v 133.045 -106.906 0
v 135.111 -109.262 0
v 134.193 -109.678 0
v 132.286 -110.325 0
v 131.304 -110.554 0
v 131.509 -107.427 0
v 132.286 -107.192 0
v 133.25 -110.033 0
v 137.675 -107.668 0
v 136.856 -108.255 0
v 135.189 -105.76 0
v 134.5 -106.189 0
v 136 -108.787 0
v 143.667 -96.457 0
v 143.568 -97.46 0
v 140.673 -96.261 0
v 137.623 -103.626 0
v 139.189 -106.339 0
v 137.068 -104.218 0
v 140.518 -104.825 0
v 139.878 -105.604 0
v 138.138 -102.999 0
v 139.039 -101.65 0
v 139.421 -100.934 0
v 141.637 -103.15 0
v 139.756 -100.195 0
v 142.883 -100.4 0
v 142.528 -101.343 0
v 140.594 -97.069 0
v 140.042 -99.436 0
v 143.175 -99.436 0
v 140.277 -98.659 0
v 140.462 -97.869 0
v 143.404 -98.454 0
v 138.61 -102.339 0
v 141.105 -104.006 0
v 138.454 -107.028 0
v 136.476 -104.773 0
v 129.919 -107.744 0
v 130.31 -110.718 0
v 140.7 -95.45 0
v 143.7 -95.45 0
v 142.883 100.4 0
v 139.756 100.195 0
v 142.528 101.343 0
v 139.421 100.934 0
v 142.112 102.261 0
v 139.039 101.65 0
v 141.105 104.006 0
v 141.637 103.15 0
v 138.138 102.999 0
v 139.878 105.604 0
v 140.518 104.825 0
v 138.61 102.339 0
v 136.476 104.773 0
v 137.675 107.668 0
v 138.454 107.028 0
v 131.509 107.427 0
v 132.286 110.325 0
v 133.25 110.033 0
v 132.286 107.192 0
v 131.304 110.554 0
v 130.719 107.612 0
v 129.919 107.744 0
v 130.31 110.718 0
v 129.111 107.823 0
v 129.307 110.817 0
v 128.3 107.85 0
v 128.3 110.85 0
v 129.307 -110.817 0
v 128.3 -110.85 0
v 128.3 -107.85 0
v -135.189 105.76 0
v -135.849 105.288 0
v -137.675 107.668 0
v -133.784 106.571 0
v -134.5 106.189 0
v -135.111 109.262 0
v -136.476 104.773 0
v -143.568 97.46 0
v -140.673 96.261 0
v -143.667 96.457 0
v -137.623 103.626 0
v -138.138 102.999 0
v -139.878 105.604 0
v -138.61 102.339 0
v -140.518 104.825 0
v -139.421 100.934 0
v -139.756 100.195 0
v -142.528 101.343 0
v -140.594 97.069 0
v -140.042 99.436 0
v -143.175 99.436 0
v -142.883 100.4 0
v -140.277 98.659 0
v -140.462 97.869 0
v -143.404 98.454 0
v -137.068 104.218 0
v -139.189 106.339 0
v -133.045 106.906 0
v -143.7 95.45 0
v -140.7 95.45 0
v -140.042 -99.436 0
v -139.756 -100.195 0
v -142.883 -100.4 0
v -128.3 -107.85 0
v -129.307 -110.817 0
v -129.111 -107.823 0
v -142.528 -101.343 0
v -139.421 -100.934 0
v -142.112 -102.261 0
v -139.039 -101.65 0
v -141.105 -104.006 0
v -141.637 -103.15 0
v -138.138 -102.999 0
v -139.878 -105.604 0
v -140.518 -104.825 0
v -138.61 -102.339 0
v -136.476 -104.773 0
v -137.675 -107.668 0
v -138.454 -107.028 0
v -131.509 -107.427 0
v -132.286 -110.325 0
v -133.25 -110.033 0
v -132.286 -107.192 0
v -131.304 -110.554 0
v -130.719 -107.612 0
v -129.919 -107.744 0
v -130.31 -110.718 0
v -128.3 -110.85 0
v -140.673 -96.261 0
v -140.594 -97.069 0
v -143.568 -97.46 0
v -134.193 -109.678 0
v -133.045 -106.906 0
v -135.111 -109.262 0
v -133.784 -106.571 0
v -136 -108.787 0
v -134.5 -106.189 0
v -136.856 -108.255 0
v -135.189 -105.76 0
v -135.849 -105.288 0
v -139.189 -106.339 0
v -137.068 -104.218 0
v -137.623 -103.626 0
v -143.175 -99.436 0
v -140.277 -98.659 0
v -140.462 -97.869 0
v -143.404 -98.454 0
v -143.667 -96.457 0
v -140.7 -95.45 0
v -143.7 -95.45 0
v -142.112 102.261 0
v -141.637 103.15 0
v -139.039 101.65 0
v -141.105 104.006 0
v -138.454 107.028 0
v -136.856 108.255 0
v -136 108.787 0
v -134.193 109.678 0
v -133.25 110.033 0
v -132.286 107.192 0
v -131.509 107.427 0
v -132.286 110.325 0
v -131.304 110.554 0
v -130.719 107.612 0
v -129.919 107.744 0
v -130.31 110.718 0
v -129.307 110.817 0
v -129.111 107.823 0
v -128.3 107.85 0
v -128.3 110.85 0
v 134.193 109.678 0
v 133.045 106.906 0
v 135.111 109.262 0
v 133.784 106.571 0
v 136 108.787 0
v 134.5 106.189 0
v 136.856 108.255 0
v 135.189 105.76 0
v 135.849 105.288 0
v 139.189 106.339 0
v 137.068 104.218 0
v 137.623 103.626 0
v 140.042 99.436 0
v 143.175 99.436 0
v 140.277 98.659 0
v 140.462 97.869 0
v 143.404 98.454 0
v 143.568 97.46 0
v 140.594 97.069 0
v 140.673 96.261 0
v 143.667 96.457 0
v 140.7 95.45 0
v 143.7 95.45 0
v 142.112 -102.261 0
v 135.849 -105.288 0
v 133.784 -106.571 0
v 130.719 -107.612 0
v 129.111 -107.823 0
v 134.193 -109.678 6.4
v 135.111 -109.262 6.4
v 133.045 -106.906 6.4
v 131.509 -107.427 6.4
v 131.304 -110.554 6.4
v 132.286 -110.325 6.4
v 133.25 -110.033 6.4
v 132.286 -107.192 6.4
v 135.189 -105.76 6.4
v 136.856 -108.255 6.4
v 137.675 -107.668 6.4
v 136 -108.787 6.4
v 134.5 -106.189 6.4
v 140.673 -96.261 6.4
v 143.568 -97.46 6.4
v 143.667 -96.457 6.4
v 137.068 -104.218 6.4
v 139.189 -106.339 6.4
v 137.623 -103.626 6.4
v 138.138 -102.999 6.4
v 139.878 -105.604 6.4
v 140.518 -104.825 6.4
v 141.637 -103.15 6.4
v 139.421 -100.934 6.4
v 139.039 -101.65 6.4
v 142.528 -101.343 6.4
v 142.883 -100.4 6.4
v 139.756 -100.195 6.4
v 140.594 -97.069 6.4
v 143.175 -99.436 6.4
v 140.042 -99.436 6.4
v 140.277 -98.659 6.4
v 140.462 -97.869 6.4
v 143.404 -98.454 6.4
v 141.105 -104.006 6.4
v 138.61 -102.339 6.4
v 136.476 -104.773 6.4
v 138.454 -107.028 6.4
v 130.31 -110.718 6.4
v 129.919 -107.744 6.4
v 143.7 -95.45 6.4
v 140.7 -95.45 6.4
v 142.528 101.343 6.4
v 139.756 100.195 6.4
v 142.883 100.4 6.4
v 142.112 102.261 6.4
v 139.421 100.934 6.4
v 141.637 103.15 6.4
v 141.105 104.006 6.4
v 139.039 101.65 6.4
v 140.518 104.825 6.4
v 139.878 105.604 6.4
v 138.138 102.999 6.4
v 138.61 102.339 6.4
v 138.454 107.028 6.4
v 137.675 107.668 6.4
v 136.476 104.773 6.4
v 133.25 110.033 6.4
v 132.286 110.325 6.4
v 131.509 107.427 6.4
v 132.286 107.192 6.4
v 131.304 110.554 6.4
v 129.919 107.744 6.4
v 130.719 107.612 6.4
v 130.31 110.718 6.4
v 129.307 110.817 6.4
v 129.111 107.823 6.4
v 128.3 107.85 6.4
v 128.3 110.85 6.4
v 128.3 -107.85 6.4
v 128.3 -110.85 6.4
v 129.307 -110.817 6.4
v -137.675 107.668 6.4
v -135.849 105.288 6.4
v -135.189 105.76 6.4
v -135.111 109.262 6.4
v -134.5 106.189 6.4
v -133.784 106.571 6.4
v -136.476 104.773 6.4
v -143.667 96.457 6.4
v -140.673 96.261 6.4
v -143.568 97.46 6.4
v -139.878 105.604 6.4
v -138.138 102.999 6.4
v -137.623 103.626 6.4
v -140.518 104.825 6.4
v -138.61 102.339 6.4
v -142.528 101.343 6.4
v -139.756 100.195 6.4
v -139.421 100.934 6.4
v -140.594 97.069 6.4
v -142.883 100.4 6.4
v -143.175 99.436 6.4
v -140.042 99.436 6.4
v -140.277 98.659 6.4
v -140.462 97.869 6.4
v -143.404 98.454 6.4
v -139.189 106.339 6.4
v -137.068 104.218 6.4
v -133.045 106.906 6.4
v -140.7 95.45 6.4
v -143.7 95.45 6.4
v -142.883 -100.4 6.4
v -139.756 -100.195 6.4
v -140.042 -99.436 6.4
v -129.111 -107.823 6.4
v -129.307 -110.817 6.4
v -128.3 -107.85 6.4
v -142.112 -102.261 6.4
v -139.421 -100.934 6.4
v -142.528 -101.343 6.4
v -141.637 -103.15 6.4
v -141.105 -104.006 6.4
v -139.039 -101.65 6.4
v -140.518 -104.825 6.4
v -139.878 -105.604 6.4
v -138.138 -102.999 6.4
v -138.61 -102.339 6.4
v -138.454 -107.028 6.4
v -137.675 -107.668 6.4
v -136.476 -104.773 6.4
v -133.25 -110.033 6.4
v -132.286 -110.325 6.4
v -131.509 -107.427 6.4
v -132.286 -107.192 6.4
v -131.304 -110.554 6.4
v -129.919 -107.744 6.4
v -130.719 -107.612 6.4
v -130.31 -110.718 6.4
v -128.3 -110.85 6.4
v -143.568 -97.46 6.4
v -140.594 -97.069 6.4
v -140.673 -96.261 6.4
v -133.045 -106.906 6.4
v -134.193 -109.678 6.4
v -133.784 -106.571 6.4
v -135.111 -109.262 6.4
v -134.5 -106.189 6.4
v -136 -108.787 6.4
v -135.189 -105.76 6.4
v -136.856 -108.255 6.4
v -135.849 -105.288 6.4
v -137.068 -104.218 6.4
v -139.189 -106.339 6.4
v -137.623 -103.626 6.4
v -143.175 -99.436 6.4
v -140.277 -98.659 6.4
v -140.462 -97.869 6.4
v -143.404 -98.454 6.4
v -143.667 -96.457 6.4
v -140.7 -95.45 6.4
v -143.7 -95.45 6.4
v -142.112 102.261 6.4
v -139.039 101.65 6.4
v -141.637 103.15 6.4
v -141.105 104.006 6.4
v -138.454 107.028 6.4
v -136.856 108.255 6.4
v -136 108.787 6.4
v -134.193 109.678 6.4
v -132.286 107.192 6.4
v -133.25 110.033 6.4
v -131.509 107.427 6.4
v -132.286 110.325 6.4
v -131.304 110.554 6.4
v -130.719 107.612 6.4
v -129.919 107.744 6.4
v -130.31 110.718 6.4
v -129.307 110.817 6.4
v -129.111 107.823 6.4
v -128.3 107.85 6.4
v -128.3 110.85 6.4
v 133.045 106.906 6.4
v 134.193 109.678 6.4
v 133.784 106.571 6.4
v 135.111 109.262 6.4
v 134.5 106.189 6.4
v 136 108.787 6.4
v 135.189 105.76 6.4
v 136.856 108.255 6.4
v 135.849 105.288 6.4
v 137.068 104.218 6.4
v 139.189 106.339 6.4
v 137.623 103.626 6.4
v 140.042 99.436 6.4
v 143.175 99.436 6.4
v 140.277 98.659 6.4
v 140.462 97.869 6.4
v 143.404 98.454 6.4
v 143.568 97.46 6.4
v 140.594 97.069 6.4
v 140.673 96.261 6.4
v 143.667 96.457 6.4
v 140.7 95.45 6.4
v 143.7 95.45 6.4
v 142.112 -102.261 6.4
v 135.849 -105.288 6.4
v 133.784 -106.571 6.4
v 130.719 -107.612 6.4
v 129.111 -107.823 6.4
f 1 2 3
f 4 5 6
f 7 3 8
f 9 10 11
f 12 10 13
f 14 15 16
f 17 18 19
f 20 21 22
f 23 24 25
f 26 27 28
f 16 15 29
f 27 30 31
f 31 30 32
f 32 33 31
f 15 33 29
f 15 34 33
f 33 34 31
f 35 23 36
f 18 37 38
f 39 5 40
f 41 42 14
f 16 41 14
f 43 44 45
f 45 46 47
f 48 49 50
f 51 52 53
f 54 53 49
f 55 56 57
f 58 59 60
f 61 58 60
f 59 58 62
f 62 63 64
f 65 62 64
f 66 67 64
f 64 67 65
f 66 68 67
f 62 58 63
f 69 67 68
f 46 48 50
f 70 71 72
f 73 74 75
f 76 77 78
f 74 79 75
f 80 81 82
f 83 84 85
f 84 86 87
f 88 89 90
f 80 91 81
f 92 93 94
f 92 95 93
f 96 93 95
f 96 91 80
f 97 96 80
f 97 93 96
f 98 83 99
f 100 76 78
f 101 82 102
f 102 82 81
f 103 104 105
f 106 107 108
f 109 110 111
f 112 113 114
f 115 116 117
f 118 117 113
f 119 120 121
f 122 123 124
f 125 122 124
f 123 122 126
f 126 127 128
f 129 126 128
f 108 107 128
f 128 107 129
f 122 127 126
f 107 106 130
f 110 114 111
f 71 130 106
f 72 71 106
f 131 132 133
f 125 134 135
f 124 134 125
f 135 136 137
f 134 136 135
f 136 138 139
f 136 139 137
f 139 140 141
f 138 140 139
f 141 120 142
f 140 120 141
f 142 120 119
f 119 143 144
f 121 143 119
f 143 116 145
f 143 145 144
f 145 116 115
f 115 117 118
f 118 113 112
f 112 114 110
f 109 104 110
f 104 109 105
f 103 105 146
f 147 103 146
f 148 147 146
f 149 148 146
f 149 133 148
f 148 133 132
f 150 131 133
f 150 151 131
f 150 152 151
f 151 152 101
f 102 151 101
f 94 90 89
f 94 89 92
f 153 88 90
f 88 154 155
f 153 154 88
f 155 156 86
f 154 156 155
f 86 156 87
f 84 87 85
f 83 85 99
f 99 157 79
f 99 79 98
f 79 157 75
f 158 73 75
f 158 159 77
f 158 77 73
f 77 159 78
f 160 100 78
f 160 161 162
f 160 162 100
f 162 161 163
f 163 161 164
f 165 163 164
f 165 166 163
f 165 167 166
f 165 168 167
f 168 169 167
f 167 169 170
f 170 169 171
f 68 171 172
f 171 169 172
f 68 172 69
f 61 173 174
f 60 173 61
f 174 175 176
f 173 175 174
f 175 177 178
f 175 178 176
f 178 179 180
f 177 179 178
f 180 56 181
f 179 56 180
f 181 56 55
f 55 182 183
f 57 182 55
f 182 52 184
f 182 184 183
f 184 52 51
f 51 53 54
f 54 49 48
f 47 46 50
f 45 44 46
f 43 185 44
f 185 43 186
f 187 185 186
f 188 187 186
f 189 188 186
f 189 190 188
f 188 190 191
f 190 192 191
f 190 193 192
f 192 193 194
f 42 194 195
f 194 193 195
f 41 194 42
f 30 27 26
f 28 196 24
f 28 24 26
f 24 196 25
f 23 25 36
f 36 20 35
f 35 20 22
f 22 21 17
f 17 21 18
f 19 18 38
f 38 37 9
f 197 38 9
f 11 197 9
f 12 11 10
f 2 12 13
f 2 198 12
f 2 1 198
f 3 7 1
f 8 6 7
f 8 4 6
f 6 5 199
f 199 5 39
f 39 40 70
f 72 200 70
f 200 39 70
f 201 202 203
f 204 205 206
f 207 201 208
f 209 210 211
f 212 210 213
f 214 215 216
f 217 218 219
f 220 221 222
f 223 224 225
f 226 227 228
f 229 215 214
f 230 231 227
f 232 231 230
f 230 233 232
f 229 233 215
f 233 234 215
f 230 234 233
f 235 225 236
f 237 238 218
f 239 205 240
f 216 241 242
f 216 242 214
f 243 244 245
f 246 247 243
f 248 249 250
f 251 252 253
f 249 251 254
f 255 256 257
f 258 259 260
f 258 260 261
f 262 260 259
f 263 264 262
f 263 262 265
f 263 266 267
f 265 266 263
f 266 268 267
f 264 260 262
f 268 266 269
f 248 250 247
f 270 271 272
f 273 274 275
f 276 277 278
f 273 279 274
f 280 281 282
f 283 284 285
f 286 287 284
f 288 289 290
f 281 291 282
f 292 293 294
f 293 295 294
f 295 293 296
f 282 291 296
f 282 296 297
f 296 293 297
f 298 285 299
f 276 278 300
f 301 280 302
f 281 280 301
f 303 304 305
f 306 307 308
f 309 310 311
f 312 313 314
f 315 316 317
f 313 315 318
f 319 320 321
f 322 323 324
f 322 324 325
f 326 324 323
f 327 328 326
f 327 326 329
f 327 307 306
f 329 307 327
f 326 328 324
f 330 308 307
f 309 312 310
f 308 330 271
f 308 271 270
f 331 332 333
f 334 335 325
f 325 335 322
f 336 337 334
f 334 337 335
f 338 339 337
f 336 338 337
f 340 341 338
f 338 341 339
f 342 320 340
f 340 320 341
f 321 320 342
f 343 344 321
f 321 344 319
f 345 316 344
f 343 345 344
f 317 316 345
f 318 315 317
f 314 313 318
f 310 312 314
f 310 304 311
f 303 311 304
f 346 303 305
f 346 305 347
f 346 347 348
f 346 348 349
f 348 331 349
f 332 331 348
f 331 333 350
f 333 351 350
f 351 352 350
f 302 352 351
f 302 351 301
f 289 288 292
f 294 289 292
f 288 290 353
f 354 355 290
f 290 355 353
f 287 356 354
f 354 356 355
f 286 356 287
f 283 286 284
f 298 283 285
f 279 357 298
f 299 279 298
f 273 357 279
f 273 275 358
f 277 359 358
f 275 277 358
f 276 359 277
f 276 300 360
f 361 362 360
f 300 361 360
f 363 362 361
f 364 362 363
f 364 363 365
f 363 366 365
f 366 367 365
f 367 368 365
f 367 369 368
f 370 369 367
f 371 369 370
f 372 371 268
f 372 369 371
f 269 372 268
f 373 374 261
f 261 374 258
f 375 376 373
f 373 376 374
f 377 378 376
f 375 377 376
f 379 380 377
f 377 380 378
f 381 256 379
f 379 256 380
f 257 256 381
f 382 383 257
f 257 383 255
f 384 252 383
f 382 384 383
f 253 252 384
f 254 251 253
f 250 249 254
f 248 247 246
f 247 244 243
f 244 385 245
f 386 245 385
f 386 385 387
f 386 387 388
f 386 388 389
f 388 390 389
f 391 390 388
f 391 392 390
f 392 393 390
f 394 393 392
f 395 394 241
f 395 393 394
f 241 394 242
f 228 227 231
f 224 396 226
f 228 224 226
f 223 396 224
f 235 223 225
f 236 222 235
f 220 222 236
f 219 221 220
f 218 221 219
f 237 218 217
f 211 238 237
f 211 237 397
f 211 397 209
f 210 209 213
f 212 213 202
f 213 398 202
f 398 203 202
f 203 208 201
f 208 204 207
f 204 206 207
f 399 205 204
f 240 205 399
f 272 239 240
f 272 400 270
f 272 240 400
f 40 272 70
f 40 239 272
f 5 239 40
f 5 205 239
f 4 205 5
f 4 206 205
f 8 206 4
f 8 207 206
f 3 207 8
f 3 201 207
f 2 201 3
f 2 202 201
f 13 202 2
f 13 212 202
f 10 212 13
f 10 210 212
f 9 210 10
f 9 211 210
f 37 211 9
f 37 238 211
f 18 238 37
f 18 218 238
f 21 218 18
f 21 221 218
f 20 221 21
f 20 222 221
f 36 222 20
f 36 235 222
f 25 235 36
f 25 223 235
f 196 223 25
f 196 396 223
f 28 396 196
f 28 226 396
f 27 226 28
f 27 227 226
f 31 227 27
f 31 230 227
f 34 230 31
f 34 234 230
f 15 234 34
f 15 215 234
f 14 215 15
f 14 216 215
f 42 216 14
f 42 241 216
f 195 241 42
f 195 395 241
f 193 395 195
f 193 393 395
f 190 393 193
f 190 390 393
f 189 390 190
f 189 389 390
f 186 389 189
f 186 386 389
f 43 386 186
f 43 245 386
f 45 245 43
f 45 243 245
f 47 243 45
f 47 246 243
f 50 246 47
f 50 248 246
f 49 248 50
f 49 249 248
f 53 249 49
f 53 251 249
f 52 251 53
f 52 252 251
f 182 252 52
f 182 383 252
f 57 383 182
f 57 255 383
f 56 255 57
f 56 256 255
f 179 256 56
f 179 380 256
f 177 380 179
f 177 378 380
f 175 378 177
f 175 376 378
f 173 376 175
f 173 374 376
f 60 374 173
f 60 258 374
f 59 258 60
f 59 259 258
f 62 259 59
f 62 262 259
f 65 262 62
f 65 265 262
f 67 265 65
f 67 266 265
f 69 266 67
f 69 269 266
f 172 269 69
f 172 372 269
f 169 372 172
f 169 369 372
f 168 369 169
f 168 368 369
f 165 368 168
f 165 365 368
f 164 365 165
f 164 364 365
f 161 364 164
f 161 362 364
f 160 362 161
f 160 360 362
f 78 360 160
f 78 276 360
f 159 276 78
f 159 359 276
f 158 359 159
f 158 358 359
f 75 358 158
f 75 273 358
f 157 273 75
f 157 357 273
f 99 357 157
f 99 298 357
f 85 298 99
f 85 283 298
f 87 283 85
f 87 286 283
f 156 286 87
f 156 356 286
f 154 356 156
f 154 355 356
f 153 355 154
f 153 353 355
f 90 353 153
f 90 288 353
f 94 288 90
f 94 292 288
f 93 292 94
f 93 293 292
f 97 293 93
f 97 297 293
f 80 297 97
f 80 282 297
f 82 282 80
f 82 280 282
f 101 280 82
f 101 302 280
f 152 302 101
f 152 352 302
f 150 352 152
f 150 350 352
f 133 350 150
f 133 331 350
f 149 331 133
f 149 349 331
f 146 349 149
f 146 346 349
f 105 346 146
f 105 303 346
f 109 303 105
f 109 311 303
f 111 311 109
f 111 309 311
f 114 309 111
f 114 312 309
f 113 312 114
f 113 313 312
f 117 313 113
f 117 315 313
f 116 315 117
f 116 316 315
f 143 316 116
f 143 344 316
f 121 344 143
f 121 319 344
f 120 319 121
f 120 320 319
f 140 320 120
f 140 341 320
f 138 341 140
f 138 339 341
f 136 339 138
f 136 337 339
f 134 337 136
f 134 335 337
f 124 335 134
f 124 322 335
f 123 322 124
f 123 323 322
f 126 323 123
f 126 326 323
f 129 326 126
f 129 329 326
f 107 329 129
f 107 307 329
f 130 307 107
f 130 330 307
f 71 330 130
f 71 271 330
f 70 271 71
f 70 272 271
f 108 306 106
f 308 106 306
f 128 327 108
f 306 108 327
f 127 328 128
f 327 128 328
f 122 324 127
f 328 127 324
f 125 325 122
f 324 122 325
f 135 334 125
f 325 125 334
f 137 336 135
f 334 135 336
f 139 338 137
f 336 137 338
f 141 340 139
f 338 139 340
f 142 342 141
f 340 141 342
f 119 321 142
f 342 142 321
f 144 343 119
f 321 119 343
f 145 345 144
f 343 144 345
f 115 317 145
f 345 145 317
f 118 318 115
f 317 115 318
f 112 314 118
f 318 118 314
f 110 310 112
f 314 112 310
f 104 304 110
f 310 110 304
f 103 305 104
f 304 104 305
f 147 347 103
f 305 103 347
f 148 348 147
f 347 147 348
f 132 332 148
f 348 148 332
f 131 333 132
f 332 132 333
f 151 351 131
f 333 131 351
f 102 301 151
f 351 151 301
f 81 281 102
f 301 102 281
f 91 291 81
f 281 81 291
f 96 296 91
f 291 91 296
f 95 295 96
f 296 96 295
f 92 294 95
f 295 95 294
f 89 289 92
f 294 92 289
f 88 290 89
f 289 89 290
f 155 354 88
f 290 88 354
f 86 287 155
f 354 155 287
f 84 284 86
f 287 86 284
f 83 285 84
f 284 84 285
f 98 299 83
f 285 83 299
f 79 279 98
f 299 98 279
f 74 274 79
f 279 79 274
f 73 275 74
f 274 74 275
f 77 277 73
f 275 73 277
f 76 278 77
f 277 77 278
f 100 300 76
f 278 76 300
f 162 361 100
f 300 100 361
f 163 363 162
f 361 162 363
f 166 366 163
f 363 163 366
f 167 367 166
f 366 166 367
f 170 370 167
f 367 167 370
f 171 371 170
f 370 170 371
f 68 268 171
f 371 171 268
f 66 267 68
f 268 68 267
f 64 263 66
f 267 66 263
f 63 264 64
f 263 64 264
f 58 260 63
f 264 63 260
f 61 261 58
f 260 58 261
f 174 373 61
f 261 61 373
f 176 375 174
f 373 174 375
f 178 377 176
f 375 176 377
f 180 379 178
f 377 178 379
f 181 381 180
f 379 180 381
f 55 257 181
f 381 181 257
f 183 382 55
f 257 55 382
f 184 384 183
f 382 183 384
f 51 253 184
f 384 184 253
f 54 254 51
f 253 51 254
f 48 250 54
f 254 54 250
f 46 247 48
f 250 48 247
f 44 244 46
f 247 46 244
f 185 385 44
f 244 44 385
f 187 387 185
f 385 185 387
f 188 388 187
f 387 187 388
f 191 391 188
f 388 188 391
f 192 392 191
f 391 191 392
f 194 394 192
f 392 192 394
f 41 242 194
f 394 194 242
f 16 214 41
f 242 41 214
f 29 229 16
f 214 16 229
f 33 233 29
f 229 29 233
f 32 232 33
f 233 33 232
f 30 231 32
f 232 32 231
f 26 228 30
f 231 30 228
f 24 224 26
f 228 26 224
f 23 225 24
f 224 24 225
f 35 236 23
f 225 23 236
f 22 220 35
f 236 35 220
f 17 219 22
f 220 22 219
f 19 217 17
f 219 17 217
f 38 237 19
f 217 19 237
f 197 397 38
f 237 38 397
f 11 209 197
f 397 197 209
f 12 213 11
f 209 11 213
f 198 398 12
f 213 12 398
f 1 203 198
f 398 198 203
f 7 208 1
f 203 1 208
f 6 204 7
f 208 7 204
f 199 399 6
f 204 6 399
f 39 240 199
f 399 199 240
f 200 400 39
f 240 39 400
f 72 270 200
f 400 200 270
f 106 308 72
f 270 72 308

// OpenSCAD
// iPad Pro 12.9" (3rd-6th gen) skeleton fit-check frame
// A thin rounded-rectangle band that hugs the iPad's outer edge.
// Open front AND back, NO retaining lip - the iPad drops straight through.
// Purpose: verify footprint + corner-radius + clearance before adding a real lip.

/* ---- iPad dimensions (12.9" Pro, flat-edge body) ---- */
ipad_w  = 280.6;  // width  (long edge, landscape)
ipad_h  = 214.9;  // height (short edge)
ipad_d  = 6.4;    // thickness (5th/6th gen = 6.4; 3rd/4th = 5.9). Using thicker to be safe.
ipad_r  = 12;     // body corner radius — measured from Apple ADG drawing (~12.2) + confirmed by print sweep

/* ---- fit / frame params (tweak these) ---- */
clr   = 0.4;   // clearance per side between iPad and frame (print tolerance)
wall  = 3.0;   // frame wall thickness (the visible border width)
band  = ipad_d;// height of the band = iPad thickness (flush, no lip)

$fn = 96;      // curve smoothness

/* ---- derived ---- */
in_w = ipad_w + 2*clr;          // inner cavity
in_h = ipad_h + 2*clr;
in_r = ipad_r + clr;
out_w = in_w + 2*wall;          // outer profile
out_h = in_h + 2*wall;
out_r = in_r + wall;

module rrect(w, h, r) {
    hull()
        for (x = [-1, 1], y = [-1, 1])
            translate([x*(w/2 - r), y*(h/2 - r)])
                circle(r = r);
}

// the frame: outer rounded rect minus inner rounded rect, extruded to band height
linear_extrude(height = band)
    difference() {
        rrect(out_w, out_h, out_r);
        rrect(in_w, in_h, in_r);
    }
